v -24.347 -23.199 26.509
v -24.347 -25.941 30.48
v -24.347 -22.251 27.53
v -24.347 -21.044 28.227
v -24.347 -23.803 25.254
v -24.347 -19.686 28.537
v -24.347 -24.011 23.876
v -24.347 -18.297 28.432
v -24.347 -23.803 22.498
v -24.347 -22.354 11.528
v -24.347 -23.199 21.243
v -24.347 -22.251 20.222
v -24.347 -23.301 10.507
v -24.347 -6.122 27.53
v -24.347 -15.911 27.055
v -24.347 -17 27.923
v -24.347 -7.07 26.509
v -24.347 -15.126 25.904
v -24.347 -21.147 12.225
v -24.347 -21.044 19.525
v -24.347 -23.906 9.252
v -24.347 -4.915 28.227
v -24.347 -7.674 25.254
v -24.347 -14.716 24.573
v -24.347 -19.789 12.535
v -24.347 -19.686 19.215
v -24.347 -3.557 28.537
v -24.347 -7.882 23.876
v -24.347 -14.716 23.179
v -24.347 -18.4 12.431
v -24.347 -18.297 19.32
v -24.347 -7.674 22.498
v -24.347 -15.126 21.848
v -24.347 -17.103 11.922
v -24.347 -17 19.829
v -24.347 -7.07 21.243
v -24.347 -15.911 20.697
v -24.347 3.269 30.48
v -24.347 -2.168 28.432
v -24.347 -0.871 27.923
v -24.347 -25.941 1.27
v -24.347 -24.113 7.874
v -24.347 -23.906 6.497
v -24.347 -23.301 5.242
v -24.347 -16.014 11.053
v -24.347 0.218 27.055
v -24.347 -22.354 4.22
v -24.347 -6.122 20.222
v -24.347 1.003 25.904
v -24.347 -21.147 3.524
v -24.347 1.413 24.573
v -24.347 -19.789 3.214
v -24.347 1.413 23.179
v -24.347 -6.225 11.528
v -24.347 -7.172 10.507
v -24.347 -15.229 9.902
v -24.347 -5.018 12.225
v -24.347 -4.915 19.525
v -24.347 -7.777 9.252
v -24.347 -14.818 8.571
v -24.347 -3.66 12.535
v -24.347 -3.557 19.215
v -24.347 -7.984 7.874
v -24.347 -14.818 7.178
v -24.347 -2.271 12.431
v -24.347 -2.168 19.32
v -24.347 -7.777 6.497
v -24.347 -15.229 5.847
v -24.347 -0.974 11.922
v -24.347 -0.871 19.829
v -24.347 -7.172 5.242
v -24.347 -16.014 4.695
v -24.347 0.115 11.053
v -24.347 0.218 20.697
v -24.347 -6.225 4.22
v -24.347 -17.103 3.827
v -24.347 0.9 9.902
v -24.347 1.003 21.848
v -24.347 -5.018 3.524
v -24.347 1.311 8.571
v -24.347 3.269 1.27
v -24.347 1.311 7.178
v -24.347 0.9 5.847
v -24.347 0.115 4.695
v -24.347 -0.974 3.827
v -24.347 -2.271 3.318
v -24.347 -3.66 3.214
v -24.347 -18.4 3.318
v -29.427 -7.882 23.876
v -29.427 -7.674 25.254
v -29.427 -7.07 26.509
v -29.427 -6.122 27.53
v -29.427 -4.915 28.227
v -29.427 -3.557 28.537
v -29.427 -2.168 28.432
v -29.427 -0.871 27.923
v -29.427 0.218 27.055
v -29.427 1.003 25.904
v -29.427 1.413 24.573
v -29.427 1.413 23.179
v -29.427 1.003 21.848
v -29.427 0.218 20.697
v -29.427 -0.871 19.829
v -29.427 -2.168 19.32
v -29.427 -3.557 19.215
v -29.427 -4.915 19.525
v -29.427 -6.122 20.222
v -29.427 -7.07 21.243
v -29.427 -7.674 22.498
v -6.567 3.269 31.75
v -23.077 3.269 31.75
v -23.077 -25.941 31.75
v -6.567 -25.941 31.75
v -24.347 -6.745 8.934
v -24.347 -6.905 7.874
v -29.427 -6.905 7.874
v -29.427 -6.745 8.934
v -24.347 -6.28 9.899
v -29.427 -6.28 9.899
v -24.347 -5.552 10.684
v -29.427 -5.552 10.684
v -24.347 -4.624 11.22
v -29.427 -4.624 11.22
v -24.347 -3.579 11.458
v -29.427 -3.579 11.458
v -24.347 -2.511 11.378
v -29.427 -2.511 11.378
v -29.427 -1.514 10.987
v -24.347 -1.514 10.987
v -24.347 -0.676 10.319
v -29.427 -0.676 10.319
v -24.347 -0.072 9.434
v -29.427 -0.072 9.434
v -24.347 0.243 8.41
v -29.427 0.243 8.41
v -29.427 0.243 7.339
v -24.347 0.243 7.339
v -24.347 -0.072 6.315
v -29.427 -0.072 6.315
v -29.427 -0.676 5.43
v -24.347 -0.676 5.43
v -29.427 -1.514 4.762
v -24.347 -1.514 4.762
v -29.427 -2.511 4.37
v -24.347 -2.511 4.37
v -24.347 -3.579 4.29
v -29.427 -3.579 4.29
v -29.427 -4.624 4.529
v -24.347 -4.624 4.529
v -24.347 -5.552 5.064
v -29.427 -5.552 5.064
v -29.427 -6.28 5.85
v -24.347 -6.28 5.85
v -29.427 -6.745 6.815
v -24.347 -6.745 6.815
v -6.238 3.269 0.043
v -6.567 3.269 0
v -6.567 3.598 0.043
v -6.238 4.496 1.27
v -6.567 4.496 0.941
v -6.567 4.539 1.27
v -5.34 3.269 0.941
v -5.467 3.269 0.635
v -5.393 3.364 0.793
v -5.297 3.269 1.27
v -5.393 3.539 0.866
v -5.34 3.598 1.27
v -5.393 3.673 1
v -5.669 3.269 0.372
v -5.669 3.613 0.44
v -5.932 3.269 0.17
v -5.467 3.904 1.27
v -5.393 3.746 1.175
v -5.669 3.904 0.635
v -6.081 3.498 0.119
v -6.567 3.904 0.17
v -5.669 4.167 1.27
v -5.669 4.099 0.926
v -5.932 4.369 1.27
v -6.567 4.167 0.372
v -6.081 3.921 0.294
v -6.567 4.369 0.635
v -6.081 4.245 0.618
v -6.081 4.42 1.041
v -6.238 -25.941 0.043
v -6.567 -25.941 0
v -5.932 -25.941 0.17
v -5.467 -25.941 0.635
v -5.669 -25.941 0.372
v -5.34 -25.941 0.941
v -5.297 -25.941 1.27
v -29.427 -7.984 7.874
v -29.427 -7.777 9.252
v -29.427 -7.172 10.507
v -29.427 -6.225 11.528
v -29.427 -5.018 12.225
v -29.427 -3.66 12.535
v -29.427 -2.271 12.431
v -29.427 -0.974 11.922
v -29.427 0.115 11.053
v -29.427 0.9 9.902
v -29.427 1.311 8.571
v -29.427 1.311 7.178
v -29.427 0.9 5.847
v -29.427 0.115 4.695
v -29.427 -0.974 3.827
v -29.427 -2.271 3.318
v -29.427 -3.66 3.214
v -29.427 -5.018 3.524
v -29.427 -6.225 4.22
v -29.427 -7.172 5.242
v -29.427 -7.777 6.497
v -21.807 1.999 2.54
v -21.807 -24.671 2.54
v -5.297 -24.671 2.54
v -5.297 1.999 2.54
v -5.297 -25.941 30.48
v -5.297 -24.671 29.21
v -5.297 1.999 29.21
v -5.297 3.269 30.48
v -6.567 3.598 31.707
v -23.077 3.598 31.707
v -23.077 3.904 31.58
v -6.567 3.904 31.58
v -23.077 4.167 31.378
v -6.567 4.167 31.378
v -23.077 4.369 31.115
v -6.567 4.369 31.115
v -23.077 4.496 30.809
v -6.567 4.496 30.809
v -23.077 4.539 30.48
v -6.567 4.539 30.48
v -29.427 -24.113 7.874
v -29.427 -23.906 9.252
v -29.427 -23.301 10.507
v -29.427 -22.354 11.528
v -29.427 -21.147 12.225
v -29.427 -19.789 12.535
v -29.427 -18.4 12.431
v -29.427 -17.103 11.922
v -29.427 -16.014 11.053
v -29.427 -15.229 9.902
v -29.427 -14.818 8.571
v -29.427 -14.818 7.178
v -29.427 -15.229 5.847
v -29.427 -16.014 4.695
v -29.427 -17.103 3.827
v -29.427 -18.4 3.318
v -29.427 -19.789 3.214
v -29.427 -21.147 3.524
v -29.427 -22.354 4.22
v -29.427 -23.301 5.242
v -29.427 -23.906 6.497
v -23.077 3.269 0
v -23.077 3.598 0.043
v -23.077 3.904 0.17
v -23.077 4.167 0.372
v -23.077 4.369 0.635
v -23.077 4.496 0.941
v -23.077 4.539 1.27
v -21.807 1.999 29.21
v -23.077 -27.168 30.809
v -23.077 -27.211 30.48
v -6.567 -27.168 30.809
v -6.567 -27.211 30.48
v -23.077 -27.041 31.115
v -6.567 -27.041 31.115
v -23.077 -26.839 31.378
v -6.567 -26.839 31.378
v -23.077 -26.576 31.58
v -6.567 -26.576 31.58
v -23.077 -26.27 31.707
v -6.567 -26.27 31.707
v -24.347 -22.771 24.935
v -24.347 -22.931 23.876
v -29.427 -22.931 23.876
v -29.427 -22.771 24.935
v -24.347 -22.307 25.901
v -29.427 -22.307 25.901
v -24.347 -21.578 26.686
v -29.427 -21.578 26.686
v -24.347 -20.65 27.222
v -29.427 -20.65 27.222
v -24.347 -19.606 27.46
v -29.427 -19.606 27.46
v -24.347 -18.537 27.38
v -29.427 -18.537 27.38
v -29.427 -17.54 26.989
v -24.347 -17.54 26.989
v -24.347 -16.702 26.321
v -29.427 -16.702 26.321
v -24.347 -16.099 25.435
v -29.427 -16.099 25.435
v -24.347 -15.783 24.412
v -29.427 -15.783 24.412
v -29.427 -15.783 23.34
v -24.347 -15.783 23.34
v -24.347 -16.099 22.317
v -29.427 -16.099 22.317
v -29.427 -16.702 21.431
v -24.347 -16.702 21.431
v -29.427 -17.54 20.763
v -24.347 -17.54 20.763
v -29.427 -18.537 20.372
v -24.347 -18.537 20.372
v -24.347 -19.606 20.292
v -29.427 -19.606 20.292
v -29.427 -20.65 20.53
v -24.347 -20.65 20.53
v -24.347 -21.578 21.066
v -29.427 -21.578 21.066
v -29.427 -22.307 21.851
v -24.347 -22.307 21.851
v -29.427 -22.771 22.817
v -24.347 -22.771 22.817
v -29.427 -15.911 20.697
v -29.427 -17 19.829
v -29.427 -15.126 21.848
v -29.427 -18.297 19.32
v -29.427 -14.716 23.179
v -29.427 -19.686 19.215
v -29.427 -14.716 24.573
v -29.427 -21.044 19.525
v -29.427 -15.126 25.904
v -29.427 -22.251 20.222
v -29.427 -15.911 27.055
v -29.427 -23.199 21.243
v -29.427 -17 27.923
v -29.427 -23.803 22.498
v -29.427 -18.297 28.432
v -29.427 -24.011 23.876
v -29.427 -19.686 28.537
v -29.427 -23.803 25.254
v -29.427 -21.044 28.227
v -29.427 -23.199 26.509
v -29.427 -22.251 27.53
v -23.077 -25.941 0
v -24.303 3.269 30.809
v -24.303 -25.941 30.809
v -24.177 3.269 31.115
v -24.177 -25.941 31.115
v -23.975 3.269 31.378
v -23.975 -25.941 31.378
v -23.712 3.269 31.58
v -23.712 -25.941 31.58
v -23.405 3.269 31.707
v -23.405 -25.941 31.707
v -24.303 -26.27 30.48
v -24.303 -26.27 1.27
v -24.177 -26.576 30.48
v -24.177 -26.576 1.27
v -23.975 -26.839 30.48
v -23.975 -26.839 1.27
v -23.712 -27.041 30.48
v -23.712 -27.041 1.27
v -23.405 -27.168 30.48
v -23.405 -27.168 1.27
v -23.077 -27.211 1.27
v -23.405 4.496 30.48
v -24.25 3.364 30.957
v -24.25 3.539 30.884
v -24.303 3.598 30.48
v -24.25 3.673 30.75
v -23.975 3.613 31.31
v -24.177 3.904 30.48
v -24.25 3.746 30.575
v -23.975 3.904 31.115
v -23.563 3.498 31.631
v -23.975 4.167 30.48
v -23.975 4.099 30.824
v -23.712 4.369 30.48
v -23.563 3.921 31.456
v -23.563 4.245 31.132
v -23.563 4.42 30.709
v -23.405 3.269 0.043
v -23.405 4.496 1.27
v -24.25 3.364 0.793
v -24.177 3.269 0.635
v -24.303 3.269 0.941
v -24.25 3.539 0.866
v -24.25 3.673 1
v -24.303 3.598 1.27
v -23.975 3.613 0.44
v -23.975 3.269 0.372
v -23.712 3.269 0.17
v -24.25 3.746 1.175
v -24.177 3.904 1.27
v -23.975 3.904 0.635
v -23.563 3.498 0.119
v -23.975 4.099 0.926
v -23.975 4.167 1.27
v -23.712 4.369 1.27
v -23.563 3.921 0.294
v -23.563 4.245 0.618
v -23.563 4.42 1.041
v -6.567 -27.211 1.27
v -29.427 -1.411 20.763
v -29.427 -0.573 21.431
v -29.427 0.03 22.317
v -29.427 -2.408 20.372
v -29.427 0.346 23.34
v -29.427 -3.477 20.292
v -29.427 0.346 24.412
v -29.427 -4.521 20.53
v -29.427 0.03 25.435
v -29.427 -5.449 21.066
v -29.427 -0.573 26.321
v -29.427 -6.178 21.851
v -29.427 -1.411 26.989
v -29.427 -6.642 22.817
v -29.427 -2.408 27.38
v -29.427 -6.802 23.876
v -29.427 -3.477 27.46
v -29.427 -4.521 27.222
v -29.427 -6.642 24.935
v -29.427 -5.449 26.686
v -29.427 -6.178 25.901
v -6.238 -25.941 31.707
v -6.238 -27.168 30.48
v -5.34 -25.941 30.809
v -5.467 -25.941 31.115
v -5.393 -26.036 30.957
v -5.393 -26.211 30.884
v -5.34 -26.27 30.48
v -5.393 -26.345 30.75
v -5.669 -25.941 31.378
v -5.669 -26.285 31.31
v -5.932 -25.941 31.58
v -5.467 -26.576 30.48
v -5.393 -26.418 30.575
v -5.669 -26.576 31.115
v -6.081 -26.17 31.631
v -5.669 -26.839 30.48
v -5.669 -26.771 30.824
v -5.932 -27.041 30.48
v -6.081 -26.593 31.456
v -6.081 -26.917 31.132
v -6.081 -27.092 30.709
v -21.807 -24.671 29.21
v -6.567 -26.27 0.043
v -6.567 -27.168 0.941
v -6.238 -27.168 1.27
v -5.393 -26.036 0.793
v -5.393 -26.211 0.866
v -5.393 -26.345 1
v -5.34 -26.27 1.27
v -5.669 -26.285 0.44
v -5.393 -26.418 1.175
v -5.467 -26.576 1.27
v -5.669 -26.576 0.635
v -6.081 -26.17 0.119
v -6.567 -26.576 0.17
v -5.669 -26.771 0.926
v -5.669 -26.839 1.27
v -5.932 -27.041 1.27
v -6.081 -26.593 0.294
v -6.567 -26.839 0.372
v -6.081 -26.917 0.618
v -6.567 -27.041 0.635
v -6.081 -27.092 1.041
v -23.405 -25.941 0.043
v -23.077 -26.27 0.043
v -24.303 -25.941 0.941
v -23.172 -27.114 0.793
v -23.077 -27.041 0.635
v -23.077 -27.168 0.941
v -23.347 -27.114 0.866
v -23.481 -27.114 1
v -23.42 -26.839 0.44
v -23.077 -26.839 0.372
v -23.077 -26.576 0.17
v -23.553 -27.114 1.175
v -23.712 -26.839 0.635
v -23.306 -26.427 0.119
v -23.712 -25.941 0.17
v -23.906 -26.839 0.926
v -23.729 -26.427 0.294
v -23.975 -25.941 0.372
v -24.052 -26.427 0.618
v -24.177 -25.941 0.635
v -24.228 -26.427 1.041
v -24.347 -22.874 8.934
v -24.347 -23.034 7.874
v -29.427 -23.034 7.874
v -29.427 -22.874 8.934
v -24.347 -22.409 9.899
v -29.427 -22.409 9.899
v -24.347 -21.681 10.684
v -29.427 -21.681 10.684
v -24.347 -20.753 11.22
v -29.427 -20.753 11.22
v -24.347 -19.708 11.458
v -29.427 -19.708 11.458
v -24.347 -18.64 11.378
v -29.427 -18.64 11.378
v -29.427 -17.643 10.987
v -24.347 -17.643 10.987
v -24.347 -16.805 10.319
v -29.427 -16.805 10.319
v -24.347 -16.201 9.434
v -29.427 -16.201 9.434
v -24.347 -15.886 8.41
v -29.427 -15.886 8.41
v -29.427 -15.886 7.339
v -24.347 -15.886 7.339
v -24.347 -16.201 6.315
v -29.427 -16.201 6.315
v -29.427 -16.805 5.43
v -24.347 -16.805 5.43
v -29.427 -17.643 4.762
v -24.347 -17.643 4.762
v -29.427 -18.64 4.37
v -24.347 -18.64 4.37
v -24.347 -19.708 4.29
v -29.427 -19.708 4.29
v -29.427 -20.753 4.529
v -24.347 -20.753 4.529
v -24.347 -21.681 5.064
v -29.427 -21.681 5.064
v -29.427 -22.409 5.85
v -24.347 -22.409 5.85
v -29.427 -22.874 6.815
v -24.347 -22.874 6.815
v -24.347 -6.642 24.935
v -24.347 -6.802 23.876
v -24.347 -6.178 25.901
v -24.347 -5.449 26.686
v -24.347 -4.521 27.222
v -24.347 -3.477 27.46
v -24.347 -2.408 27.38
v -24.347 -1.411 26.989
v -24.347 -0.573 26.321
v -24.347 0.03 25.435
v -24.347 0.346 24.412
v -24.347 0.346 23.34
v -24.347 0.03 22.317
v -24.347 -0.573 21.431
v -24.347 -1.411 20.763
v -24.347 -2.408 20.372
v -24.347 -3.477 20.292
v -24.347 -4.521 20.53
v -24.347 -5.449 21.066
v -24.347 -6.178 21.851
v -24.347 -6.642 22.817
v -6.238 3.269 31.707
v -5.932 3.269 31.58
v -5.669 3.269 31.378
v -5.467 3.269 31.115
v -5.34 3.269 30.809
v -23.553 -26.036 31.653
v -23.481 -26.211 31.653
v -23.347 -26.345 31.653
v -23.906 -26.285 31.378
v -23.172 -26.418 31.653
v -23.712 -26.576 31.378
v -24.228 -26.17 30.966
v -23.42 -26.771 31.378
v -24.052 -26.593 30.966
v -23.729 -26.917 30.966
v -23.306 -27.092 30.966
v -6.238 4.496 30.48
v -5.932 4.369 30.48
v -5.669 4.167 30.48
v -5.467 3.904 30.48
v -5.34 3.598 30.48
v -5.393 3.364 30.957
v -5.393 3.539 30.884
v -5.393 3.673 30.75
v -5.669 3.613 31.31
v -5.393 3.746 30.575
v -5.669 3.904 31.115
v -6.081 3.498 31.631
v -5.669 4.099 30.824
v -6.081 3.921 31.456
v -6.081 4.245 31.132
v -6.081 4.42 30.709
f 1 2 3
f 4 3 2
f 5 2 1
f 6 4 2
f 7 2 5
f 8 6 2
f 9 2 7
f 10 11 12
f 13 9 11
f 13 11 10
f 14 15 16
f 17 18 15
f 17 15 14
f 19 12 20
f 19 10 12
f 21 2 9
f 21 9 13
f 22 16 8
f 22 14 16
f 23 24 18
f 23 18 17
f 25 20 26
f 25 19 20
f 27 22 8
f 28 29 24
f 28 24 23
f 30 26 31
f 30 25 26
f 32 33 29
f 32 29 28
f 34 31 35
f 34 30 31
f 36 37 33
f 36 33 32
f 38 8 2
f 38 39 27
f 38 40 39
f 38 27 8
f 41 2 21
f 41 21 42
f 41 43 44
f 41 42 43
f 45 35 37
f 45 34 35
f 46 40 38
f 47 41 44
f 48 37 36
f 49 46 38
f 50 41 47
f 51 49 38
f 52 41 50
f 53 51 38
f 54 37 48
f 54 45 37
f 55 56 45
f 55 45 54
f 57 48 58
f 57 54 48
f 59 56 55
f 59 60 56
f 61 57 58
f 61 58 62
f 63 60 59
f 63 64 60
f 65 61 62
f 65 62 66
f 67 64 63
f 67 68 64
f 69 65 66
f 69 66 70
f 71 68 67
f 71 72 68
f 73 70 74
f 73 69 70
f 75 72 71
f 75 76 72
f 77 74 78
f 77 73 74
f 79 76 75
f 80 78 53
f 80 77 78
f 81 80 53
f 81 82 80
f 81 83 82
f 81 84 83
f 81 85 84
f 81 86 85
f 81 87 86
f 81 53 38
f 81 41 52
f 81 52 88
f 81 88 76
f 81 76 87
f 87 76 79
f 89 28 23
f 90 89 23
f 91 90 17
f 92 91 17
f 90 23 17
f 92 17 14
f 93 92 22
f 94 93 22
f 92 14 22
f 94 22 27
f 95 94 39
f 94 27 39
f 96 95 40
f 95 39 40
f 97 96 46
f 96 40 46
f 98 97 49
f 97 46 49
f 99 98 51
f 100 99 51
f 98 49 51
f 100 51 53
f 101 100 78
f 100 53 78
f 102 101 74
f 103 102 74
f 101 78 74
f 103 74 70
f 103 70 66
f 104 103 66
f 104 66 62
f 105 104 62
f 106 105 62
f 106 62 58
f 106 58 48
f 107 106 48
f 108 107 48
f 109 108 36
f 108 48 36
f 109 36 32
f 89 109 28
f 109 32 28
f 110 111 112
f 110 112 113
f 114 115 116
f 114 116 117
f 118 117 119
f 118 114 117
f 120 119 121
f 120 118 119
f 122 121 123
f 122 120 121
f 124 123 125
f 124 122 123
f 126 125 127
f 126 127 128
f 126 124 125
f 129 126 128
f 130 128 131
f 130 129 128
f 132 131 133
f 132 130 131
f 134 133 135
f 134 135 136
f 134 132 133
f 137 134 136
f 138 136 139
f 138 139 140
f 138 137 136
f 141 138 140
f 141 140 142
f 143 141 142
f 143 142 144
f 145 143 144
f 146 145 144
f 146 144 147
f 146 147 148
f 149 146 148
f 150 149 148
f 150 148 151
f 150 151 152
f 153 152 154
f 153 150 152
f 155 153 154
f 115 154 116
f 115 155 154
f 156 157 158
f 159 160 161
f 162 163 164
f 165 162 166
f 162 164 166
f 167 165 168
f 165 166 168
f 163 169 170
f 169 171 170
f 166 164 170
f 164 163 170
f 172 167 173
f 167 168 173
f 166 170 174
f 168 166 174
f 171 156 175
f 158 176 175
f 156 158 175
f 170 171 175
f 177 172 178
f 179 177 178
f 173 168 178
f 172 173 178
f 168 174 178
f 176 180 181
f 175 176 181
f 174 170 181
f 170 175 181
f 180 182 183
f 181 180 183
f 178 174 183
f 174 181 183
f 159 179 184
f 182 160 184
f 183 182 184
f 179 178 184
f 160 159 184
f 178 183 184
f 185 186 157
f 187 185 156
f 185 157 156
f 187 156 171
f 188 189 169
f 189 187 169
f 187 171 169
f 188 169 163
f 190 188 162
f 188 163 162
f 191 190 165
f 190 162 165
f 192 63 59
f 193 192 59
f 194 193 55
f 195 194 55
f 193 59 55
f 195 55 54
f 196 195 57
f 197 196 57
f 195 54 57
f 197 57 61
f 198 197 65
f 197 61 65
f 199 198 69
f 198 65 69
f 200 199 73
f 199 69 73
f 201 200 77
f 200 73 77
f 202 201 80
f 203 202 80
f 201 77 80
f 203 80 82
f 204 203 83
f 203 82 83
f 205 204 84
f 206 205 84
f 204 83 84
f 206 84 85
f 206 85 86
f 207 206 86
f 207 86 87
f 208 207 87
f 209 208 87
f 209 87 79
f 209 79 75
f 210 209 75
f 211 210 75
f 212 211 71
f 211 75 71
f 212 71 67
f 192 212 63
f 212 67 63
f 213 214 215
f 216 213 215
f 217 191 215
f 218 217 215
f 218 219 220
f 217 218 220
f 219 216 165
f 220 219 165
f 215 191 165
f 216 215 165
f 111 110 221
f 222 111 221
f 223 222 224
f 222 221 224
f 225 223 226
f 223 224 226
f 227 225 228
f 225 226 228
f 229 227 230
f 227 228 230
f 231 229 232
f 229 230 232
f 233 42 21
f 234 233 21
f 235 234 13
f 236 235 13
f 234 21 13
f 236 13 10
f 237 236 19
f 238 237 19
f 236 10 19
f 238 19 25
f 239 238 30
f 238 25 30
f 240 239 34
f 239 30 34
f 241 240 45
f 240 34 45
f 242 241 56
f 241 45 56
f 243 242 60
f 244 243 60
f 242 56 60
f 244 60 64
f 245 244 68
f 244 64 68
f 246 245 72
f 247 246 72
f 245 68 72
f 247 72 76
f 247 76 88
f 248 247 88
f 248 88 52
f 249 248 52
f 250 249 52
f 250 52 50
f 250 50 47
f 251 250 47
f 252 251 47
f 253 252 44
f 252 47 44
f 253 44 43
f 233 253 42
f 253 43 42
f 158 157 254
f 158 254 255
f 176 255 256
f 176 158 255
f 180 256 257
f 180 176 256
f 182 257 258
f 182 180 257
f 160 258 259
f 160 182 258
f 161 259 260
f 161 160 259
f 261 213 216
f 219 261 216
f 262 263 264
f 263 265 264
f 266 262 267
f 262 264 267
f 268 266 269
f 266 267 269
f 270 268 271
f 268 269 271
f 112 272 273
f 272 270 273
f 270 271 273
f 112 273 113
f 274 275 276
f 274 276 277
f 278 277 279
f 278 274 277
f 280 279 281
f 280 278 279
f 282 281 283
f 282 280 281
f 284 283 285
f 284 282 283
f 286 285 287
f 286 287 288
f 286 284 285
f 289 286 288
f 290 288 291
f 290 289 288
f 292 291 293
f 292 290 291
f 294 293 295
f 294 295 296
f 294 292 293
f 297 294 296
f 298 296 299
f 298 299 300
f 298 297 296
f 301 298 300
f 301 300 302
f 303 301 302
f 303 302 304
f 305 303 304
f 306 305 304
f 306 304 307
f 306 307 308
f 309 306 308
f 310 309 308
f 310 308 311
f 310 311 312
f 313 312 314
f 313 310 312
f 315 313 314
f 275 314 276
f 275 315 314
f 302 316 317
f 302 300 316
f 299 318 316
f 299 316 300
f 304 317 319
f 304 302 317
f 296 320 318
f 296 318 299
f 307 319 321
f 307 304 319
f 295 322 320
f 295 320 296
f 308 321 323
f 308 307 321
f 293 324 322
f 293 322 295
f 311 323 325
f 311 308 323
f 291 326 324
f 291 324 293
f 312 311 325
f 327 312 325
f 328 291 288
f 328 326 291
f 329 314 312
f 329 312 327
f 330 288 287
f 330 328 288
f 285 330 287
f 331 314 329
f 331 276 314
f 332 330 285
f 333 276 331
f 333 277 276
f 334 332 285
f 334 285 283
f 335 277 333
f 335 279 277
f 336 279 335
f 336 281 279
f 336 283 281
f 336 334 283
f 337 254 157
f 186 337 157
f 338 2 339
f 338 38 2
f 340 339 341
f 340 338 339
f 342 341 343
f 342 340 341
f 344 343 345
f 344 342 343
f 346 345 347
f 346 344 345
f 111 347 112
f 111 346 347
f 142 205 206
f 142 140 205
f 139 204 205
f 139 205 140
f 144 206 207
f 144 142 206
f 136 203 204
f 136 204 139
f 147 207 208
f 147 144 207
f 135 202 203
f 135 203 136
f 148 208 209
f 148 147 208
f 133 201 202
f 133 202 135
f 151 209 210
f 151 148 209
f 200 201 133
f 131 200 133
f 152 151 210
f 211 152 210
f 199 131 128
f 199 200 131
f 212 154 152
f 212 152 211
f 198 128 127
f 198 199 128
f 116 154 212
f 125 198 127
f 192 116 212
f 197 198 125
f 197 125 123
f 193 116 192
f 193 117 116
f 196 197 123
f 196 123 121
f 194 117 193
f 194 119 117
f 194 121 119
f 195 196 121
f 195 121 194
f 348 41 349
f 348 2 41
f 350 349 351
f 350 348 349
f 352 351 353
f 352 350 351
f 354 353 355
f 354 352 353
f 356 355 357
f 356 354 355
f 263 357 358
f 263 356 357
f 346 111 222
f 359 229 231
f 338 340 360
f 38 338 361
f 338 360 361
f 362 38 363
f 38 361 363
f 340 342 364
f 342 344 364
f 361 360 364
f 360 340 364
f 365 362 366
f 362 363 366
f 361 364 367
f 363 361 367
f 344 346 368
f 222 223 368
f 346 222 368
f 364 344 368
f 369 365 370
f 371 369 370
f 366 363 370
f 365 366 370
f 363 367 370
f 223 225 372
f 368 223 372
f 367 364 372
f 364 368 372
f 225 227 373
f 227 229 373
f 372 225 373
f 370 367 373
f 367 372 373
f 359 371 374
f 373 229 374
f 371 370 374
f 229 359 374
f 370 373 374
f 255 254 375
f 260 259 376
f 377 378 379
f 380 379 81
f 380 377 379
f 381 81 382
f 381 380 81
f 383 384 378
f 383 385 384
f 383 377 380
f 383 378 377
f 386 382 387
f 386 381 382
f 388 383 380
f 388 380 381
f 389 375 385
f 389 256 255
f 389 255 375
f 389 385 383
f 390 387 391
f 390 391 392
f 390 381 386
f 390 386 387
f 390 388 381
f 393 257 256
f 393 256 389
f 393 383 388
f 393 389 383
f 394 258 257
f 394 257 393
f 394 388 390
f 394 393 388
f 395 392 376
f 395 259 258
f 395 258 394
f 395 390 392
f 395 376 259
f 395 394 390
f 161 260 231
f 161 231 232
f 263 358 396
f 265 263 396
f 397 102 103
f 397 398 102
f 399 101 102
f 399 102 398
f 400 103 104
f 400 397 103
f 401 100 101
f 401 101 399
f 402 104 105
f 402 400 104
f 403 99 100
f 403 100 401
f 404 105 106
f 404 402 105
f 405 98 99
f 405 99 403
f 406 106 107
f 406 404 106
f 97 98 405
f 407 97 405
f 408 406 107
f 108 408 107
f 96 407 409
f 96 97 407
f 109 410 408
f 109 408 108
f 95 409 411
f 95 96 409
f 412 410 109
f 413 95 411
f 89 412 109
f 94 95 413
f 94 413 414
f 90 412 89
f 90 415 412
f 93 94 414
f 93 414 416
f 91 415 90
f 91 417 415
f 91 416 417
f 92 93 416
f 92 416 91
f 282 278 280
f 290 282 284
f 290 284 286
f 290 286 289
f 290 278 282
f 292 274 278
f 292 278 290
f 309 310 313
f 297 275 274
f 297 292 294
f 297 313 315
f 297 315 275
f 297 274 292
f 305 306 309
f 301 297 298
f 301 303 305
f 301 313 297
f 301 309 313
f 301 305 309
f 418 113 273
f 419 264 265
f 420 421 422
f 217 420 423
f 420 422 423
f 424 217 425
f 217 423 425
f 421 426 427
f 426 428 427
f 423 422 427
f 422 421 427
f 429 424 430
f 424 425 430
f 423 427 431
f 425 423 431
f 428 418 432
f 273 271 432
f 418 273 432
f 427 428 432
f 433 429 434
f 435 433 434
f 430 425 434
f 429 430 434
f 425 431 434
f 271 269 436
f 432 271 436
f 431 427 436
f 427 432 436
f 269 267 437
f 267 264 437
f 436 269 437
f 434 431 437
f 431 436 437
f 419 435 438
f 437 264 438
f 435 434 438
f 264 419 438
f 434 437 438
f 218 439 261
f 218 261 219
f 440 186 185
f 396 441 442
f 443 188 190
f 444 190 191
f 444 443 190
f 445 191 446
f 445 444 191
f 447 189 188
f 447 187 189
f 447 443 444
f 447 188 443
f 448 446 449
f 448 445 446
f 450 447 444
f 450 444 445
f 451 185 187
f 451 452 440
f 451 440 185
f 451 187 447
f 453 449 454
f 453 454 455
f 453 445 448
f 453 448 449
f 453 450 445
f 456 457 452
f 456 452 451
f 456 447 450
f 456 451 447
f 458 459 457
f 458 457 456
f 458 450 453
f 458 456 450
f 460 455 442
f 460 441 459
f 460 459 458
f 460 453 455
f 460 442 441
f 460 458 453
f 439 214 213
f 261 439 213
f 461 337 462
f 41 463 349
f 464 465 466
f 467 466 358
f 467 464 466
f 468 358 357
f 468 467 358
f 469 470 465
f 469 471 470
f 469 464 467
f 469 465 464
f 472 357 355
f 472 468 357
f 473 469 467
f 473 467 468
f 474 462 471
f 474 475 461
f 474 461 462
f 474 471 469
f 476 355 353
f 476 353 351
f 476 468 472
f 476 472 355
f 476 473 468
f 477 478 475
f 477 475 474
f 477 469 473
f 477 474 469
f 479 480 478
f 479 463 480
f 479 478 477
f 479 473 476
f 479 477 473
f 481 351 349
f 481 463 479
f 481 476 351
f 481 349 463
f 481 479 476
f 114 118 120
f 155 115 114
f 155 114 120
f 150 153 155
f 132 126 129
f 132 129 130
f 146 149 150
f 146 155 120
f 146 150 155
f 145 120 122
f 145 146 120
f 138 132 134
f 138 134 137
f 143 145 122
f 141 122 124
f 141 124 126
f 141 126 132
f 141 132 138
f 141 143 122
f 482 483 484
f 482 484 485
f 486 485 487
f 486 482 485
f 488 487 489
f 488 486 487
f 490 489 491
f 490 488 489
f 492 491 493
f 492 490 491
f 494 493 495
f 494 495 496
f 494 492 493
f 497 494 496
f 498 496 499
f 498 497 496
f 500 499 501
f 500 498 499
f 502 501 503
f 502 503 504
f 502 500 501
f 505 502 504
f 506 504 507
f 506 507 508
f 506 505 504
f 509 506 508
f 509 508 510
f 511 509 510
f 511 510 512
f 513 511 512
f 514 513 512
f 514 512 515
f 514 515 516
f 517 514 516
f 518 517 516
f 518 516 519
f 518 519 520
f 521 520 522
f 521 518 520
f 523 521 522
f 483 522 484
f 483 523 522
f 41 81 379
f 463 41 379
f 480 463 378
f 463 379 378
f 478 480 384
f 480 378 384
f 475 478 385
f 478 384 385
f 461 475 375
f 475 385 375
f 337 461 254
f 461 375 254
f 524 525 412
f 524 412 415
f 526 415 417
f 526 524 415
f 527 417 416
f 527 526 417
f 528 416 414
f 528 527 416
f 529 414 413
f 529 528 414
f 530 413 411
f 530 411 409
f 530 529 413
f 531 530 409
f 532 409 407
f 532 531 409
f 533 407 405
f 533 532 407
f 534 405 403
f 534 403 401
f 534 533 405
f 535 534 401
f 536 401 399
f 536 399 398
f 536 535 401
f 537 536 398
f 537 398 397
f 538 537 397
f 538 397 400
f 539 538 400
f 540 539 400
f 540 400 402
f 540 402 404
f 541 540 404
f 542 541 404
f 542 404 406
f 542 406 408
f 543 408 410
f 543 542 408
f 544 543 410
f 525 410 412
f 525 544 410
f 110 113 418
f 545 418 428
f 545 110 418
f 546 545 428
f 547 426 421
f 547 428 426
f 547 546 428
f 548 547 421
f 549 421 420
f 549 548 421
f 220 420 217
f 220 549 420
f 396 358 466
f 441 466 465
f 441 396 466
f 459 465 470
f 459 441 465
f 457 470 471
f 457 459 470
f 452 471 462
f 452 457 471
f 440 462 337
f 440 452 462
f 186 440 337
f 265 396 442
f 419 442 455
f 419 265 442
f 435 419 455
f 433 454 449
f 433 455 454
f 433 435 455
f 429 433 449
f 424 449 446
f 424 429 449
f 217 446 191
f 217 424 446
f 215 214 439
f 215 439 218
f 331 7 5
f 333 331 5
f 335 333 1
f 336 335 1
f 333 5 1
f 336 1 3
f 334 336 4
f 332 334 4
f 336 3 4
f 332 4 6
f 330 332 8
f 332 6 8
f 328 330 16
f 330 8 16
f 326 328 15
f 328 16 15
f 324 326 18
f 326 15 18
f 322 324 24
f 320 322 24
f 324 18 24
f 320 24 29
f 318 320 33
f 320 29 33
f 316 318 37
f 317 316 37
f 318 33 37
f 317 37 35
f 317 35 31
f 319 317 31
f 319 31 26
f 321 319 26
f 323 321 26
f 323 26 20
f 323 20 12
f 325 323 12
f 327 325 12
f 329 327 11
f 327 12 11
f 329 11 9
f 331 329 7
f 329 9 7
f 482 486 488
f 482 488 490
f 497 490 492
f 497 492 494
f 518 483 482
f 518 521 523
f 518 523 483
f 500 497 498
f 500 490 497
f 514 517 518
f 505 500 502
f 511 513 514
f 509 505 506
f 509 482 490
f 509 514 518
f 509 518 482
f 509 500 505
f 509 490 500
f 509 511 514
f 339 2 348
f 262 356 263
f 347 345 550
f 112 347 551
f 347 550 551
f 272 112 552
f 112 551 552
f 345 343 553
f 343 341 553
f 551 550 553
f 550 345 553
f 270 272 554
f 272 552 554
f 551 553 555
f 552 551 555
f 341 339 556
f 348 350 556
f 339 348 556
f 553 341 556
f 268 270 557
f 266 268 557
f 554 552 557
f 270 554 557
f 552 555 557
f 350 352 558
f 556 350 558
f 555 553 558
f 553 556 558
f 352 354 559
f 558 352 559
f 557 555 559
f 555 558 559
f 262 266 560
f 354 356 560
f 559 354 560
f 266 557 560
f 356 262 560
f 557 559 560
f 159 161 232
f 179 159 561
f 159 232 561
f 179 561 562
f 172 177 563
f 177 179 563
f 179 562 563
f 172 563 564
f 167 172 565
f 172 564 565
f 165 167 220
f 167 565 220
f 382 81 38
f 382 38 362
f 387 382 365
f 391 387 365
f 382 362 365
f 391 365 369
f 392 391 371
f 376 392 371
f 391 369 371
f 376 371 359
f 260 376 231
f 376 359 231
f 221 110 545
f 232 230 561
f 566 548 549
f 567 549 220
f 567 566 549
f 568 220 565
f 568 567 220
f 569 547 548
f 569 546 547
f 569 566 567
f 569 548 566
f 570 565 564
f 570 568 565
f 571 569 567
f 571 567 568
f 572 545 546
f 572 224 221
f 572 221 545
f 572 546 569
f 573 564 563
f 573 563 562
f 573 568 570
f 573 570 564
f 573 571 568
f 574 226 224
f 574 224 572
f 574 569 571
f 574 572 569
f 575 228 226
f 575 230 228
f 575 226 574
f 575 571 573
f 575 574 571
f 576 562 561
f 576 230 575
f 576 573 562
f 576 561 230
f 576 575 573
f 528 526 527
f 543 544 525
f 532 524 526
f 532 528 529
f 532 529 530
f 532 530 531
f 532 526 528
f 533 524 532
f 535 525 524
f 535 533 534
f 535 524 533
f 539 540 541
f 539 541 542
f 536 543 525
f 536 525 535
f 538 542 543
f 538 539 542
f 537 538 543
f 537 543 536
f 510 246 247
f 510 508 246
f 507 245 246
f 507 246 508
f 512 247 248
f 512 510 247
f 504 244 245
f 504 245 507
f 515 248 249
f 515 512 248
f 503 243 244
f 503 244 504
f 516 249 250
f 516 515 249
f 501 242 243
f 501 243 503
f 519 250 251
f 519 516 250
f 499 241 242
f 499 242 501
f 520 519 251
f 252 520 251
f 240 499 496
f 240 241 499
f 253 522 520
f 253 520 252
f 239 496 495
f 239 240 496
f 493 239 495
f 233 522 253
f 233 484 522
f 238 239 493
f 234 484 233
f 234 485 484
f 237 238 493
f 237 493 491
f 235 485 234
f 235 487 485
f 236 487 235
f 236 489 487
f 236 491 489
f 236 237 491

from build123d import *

# Parameters (mm, degrees)
F0_W     = 19.05
F0_H     = 31.75
F1_DEPTH = 31.75
F2_T     = -2.54
F4_R     = 4.6736
F4_R_2   = 3.5941
F5_DEPTH = 5.08
F6_R     = 1.27


# Not quite as in the source:
# - a feature names something its author has since deleted; it is built from what else it names


with BuildPart() as f1:
    # F0 (on Top) → F1 (new body)
    with BuildSketch(Plane.XY):
        with Locations((-14.8217186228, -11.3360365331)):
            Rectangle(F0_W, F0_H)
    extrude(amount=F1_DEPTH)

    # F2
    f2_openings = [f1.faces().sort_by_distance(p)[0] for p in [
        (-5.296719, -11.336037, 15.875),
    ]]
    offset(amount=F2_T, openings=f2_openings)

    # F4 (on face) → F5 (join)
    with BuildSketch(Plane(origin=(-24.3467186228, 0, 0), x_dir=(0, -1, 0), z_dir=(-1, 0, 0))):
        with Locations((19.3370365331, 23.876)):
            Circle(F4_R)
        with Locations((19.3370365331, 23.876)):
            Circle(F4_R_2, mode=Mode.SUBTRACT)
        with Locations((3.2080365331, 23.876)):
            Circle(F4_R)
        with Locations((3.2080365331, 23.876)):
            Circle(F4_R_2, mode=Mode.SUBTRACT)
        with Locations((3.3106288512, 7.8743288743)):
            Circle(F4_R)
        with Locations((3.3106288512, 7.8743288743)):
            Circle(F4_R_2, mode=Mode.SUBTRACT)
        with Locations((19.4396288512, 7.8743288743)):
            Circle(F4_R)
        with Locations((19.4396288512, 7.8743288743)):
            Circle(F4_R_2, mode=Mode.SUBTRACT)
    extrude(amount=F5_DEPTH)

    # F6
    f6_edges = [f1.edges().sort_by_distance(p)[0] for p in [
        (-14.821719, 4.538963, 0),
        (-24.346719, -11.336037, 0),
        (-14.821719, -27.211037, 0),
        (-5.296719, -11.336037, 0),
        (-24.346719, -27.211037, 15.875),
        (-14.821719, 4.538963, 31.75),
        (-24.346719, -11.336037, 31.75),
        (-14.821719, -27.211037, 31.75),
        (-5.296719, -11.336037, 31.75),
        (-5.296719, -27.211037, 15.875),
        (-5.296719, 4.538963, 15.875),
        (-24.346719, 4.538963, 15.875),
    ]]
    fillet(f6_edges, radius=F6_R)


solid = f1.part
